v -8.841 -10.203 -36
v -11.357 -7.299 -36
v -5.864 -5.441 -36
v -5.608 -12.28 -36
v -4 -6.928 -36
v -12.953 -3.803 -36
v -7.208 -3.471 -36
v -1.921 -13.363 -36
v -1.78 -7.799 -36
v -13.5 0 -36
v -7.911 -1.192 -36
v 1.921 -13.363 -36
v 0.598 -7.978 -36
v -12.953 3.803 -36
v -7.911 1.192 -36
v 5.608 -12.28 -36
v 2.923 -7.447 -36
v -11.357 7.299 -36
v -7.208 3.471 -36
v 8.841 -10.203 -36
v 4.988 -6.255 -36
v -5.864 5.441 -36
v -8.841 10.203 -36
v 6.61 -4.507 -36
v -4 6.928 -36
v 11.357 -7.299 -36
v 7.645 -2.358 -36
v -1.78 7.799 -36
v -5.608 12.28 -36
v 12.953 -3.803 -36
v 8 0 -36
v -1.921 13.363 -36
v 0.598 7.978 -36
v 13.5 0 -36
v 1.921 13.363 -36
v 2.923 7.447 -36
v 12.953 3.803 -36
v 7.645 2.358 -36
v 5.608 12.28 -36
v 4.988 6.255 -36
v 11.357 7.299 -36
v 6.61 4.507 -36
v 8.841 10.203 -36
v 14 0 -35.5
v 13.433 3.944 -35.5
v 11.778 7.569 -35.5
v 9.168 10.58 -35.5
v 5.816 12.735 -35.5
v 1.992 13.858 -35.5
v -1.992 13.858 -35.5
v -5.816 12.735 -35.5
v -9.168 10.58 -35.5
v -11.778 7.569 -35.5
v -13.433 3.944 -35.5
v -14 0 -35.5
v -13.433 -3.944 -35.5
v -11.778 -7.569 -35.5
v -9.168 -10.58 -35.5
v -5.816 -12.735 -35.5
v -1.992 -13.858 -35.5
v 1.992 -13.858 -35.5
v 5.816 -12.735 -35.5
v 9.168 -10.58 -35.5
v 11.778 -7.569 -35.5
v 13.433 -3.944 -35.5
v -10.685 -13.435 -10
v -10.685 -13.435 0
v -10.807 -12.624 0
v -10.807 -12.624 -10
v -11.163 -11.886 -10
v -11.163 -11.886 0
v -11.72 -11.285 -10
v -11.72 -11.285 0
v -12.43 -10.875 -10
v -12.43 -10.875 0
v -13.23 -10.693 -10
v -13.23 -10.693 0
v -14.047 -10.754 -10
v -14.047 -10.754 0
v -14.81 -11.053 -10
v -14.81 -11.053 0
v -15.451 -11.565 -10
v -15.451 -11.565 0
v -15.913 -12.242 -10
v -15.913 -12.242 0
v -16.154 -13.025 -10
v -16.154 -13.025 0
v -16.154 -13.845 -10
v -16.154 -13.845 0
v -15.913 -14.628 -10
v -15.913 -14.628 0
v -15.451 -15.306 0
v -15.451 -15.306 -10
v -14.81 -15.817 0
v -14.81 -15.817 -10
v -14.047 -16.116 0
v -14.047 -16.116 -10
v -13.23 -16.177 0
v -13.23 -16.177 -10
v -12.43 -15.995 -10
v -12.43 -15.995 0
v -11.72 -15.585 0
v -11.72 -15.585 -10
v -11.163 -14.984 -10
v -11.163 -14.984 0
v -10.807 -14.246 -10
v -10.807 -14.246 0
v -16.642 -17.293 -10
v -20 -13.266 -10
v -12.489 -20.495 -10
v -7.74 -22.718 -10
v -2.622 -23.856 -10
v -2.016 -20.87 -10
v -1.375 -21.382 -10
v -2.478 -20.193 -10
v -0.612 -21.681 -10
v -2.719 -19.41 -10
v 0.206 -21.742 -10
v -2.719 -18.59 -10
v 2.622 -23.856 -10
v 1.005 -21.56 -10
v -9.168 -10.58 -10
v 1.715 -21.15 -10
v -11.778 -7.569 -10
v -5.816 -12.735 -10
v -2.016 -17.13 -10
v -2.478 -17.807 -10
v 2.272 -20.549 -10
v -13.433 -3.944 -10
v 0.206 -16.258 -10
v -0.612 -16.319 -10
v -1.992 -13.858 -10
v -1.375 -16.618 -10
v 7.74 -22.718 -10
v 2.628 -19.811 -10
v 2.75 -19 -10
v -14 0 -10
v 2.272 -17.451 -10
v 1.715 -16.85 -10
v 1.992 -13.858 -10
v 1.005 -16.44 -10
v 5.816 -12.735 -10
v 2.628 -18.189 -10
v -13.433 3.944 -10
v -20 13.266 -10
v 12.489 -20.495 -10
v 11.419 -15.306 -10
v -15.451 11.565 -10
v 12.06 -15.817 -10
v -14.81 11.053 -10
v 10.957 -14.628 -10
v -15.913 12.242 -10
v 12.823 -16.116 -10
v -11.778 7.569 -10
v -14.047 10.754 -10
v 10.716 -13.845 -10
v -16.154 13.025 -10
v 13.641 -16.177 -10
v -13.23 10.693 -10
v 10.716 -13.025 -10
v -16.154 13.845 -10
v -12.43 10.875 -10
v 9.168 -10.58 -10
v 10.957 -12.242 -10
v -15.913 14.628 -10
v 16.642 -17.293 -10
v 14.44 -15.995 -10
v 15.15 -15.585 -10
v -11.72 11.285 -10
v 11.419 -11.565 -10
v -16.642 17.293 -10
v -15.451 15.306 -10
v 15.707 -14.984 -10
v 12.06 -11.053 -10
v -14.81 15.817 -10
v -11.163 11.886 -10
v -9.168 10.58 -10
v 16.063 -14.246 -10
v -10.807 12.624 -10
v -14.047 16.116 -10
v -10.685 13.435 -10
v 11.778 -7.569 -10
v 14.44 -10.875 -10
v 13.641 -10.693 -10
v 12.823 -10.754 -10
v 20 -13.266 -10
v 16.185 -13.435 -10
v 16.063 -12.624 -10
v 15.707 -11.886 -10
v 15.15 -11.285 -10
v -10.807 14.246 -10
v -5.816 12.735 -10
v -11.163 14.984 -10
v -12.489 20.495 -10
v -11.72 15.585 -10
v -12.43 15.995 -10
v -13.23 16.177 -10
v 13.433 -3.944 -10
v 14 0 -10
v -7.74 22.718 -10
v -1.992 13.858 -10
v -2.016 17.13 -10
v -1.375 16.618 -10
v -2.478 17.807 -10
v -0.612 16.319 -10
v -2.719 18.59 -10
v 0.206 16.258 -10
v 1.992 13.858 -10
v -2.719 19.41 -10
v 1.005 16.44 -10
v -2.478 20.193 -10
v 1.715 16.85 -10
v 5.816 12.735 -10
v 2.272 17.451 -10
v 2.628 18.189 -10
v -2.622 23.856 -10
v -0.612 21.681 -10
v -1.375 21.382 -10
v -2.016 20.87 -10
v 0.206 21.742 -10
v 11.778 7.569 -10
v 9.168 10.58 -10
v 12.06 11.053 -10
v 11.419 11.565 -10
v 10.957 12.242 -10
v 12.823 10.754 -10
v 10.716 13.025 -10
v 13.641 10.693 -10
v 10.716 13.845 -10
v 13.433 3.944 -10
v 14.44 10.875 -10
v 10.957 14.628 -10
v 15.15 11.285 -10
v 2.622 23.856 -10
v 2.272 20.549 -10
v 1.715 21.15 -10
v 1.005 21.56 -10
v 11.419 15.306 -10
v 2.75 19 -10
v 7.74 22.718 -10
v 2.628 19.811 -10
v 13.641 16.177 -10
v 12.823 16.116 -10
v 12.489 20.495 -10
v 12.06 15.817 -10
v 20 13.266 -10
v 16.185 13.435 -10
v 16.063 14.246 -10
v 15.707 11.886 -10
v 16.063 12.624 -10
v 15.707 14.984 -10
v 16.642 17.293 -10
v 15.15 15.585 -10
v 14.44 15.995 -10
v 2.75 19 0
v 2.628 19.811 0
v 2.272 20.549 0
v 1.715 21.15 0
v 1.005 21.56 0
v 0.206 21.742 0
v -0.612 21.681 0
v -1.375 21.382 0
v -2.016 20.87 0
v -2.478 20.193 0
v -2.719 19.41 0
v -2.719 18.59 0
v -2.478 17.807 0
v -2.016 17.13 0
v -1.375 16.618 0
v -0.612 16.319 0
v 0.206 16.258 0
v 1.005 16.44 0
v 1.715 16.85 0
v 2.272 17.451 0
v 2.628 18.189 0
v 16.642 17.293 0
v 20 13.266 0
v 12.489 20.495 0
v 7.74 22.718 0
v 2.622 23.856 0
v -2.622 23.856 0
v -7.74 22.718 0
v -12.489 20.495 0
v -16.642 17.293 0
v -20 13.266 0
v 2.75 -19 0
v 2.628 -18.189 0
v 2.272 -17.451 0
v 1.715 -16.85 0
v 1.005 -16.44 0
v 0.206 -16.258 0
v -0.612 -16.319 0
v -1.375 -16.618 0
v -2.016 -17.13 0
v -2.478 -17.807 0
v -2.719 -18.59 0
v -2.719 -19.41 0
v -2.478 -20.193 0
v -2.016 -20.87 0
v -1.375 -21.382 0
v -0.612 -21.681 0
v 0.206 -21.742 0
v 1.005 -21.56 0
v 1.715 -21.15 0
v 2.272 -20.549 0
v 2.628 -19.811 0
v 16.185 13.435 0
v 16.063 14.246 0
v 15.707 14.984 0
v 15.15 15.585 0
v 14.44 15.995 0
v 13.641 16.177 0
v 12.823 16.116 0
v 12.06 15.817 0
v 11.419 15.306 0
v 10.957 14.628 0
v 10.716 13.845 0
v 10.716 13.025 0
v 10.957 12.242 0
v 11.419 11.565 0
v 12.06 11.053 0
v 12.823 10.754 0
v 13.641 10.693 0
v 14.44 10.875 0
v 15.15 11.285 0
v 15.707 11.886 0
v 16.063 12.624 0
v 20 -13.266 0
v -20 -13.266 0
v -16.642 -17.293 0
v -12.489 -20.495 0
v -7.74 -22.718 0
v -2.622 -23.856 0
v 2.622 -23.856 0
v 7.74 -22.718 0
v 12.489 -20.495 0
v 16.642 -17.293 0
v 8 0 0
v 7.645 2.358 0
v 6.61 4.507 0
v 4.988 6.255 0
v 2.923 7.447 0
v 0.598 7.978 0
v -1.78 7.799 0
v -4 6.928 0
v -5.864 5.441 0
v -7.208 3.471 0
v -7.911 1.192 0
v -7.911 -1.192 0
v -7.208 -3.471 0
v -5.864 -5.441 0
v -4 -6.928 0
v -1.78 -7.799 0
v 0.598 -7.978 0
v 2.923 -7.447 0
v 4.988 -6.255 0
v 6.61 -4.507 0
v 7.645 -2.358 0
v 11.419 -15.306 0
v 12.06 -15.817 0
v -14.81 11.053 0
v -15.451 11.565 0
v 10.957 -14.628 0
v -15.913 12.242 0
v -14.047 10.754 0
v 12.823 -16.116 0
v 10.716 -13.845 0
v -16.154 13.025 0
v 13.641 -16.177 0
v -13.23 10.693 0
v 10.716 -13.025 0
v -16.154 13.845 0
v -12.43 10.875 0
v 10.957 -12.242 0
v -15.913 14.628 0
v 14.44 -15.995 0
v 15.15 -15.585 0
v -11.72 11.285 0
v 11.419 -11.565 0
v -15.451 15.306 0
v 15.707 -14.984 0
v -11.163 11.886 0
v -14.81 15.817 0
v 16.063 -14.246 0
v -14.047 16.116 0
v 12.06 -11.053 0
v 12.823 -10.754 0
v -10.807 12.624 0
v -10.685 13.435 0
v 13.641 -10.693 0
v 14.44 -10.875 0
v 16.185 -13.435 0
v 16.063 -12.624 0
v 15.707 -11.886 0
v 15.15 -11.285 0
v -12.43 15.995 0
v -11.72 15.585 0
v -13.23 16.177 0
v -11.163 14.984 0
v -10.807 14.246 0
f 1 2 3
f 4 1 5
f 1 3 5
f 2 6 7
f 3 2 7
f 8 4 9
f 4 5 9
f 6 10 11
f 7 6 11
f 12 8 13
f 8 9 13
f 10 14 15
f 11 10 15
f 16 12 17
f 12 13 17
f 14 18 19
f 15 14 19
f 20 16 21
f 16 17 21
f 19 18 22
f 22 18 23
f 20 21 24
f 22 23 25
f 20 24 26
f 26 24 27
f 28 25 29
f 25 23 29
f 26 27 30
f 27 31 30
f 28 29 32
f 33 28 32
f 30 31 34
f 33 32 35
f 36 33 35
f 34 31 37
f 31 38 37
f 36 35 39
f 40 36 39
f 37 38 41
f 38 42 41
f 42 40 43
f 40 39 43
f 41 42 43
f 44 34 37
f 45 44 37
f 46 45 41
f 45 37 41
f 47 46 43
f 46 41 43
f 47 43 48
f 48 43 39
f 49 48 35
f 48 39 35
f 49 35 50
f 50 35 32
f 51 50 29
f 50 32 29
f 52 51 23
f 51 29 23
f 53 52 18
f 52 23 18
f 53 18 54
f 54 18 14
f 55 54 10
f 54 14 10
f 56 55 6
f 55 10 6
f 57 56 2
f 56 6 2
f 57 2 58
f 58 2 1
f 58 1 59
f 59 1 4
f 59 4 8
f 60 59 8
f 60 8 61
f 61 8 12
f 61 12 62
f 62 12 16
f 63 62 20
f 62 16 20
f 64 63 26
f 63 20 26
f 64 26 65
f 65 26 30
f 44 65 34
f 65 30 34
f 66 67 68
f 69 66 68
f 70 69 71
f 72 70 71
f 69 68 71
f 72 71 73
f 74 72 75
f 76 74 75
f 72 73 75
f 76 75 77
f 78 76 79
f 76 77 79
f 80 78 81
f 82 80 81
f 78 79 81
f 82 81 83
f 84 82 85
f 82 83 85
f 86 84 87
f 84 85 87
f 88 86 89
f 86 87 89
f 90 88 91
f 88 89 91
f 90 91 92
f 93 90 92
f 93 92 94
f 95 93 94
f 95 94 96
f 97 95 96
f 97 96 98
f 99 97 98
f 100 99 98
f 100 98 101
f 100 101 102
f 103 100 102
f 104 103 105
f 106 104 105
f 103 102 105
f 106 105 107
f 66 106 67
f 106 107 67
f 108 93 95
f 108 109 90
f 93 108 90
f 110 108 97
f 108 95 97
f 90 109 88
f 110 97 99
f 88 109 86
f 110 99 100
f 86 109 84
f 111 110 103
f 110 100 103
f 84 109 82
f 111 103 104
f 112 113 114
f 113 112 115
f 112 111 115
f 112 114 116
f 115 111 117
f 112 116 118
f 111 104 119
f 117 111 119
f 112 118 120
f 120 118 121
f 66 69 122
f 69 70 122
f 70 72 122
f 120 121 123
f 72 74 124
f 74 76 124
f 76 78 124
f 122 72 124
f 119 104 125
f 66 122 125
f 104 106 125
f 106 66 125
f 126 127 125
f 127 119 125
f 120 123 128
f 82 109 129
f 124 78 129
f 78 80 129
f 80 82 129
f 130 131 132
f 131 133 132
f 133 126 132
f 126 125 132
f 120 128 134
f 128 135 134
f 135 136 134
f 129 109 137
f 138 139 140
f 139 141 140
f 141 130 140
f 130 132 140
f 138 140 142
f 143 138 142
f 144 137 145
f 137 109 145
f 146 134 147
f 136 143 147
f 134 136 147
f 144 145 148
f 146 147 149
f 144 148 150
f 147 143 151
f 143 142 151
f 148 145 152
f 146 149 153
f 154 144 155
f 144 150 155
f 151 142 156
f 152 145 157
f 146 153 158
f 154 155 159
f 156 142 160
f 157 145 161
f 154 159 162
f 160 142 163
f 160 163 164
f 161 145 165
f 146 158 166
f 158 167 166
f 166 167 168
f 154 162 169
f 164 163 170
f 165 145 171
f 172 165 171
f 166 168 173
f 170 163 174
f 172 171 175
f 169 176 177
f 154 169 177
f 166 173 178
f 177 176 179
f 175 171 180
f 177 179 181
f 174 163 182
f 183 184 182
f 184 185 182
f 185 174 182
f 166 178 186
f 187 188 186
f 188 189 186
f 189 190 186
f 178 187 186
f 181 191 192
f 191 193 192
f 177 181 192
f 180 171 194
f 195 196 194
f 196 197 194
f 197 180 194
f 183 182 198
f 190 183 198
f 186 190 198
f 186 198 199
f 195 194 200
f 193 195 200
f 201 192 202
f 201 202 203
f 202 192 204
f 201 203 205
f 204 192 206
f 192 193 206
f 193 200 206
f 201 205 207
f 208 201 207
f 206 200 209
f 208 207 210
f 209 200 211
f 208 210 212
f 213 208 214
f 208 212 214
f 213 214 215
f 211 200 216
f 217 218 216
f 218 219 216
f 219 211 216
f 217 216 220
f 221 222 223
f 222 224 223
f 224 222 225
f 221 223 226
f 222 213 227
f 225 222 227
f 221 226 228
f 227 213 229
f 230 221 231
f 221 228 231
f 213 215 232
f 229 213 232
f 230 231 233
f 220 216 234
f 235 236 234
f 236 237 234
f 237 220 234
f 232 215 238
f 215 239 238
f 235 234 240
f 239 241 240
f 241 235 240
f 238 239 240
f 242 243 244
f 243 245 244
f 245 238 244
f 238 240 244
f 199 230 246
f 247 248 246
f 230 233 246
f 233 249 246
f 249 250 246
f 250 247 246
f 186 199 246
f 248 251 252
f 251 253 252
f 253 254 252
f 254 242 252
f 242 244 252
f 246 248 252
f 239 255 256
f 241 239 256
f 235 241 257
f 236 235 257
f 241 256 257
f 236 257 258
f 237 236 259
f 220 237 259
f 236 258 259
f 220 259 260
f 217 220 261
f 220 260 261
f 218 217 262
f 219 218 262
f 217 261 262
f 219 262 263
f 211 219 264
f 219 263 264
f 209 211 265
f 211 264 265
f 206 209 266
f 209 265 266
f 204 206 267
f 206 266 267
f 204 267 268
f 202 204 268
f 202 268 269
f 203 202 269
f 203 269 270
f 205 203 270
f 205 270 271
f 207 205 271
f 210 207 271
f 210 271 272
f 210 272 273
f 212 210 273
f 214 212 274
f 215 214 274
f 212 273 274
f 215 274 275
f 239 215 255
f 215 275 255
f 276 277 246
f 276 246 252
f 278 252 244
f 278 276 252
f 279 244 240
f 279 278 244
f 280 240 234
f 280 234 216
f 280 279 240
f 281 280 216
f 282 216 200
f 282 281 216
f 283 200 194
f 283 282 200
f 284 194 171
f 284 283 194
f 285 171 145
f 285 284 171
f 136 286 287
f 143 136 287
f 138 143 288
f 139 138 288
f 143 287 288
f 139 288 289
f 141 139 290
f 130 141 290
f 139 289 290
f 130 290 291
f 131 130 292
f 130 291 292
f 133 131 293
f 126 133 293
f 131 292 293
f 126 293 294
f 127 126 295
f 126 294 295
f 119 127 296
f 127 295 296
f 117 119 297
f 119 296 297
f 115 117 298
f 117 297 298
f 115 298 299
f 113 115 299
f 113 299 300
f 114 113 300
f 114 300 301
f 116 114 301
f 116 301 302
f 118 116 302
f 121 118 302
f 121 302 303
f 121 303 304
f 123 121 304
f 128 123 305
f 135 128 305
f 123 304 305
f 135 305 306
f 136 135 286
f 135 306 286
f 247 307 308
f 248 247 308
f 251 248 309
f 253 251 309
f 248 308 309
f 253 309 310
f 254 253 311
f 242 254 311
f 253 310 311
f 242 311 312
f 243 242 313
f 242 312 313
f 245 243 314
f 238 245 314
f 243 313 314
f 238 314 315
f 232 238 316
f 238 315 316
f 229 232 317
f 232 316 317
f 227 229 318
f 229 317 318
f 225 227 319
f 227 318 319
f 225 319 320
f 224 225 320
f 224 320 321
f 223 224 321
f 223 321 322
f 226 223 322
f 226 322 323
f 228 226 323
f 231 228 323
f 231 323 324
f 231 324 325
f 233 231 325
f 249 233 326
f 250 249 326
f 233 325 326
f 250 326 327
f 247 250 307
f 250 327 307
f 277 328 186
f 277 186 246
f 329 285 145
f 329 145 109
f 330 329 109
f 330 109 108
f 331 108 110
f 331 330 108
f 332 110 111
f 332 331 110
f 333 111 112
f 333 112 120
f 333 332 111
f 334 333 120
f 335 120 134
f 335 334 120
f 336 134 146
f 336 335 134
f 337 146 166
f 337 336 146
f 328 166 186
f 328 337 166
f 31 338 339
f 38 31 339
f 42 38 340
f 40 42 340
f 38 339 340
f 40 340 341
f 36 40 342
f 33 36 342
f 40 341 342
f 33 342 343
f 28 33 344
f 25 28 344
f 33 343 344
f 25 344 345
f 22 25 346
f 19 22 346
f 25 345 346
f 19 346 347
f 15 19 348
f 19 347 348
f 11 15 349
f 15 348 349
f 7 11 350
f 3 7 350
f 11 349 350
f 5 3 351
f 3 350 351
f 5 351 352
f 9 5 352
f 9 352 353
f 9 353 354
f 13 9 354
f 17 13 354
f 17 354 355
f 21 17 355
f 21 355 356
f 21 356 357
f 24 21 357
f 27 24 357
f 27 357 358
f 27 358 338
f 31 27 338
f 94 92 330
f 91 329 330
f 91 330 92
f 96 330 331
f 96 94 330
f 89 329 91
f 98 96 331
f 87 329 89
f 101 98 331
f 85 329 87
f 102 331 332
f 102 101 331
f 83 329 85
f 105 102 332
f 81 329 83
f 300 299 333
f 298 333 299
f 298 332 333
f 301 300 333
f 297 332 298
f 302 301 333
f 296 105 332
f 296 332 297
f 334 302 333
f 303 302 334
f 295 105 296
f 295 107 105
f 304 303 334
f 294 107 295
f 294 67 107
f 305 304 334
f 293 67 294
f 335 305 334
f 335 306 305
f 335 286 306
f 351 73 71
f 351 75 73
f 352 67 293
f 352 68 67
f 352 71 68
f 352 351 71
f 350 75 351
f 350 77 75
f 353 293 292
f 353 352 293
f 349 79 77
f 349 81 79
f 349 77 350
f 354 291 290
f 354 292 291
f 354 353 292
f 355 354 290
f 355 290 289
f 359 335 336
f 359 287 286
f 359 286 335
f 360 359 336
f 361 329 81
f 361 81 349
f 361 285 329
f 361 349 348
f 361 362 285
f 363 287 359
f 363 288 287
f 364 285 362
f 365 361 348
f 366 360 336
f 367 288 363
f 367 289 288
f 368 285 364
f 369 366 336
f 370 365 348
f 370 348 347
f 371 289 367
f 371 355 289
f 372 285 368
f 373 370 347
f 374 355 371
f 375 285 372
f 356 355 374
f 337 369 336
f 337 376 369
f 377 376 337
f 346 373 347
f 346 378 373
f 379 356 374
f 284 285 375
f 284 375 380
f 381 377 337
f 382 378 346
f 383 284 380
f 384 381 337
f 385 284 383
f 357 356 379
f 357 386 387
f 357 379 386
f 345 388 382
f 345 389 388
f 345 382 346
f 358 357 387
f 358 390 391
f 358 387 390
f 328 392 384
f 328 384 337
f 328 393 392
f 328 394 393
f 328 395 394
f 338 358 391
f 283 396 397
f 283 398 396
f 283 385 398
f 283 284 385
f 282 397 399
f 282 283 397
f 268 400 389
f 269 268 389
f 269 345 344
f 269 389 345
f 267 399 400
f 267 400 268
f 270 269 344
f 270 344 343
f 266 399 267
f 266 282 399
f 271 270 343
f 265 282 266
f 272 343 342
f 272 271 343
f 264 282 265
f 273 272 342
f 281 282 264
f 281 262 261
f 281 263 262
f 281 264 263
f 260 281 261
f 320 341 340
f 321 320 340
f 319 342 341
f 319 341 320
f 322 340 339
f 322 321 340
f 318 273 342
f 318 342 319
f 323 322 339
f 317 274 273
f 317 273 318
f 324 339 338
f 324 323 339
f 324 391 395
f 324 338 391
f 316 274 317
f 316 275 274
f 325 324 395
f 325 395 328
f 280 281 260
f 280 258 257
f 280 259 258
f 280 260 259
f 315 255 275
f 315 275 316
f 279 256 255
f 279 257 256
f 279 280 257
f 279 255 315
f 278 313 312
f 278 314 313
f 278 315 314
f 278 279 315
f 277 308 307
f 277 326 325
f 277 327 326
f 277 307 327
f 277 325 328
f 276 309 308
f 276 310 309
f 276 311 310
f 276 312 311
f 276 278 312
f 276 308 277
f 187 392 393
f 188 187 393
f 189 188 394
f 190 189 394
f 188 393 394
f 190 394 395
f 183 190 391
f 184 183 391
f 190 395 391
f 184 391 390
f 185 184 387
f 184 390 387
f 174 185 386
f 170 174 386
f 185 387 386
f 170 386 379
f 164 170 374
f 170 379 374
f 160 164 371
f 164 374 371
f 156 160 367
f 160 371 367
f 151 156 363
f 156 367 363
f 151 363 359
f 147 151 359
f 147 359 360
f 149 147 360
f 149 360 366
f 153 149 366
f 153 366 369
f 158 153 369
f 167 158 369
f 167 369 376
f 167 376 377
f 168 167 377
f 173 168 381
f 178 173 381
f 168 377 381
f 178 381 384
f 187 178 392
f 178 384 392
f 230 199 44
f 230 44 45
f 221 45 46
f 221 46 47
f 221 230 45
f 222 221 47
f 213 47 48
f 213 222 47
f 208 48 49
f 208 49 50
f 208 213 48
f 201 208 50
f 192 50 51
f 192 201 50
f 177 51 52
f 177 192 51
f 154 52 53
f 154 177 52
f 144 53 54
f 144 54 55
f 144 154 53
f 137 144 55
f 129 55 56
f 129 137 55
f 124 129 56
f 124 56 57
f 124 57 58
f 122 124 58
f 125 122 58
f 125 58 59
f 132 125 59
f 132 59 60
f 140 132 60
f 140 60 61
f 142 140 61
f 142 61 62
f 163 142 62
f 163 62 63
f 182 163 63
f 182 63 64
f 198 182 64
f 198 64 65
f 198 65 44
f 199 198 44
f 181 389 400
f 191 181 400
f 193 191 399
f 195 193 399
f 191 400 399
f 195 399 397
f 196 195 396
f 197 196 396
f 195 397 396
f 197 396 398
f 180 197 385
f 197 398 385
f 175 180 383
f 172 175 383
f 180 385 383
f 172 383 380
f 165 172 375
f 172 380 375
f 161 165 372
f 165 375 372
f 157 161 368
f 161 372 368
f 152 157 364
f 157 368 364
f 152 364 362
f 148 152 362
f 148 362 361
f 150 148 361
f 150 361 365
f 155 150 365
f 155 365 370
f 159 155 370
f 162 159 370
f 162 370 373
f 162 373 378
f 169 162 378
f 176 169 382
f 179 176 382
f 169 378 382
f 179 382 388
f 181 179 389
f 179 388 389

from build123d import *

# Parameters (mm, degrees)
F0_R     = 2.75
F0_R_2   = 14
F0_R_3   = 8
F1_DEPTH = 10
F2_DEPTH = 36
F3_SIZE  = 0.5


with BuildPart() as f1:
    # F0 (on Top) → F1 (new body)
    with BuildSketch(Plane.XY):
        with BuildLine():
            Line((20, -13.266499), (20, 13.266499))
            ThreePointArc((20, 13.266499), (0, 24), (-20, 13.266499))
            Line((-20, 13.266499), (-20, -13.266499))
            ThreePointArc((-20, -13.266499), (0, -24), (20, -13.266499))
        make_face()
        with Locations((-13.435029, -13.435029)):
            Circle(F0_R, mode=Mode.SUBTRACT)
        with Locations((0, -19)):
            Circle(F0_R, mode=Mode.SUBTRACT)
        with Locations((13.435029, -13.435029)):
            Circle(F0_R, mode=Mode.SUBTRACT)
        with Locations((-13.435029, 13.435029)):
            Circle(F0_R, mode=Mode.SUBTRACT)
        Circle(F0_R_2, mode=Mode.SUBTRACT)
        with Locations((0, 19)):
            Circle(F0_R, mode=Mode.SUBTRACT)
        with Locations((13.435029, 13.435029)):
            Circle(F0_R, mode=Mode.SUBTRACT)
        Circle(F0_R_2)
        Circle(F0_R_3, mode=Mode.SUBTRACT)
    extrude(amount=-F1_DEPTH)

    # F0 (on Top) → F2 (join)
    with BuildSketch(Plane.XY):
        Circle(F0_R_2)
        Circle(F0_R_3, mode=Mode.SUBTRACT)
    extrude(amount=-F2_DEPTH)

    # F3
    f3_edges = [f1.edges().sort_by_distance(p)[0] for p in [
        (-14, 0, -36),
    ]]
    chamfer(f3_edges, length=F3_SIZE)


solid = f1.part
